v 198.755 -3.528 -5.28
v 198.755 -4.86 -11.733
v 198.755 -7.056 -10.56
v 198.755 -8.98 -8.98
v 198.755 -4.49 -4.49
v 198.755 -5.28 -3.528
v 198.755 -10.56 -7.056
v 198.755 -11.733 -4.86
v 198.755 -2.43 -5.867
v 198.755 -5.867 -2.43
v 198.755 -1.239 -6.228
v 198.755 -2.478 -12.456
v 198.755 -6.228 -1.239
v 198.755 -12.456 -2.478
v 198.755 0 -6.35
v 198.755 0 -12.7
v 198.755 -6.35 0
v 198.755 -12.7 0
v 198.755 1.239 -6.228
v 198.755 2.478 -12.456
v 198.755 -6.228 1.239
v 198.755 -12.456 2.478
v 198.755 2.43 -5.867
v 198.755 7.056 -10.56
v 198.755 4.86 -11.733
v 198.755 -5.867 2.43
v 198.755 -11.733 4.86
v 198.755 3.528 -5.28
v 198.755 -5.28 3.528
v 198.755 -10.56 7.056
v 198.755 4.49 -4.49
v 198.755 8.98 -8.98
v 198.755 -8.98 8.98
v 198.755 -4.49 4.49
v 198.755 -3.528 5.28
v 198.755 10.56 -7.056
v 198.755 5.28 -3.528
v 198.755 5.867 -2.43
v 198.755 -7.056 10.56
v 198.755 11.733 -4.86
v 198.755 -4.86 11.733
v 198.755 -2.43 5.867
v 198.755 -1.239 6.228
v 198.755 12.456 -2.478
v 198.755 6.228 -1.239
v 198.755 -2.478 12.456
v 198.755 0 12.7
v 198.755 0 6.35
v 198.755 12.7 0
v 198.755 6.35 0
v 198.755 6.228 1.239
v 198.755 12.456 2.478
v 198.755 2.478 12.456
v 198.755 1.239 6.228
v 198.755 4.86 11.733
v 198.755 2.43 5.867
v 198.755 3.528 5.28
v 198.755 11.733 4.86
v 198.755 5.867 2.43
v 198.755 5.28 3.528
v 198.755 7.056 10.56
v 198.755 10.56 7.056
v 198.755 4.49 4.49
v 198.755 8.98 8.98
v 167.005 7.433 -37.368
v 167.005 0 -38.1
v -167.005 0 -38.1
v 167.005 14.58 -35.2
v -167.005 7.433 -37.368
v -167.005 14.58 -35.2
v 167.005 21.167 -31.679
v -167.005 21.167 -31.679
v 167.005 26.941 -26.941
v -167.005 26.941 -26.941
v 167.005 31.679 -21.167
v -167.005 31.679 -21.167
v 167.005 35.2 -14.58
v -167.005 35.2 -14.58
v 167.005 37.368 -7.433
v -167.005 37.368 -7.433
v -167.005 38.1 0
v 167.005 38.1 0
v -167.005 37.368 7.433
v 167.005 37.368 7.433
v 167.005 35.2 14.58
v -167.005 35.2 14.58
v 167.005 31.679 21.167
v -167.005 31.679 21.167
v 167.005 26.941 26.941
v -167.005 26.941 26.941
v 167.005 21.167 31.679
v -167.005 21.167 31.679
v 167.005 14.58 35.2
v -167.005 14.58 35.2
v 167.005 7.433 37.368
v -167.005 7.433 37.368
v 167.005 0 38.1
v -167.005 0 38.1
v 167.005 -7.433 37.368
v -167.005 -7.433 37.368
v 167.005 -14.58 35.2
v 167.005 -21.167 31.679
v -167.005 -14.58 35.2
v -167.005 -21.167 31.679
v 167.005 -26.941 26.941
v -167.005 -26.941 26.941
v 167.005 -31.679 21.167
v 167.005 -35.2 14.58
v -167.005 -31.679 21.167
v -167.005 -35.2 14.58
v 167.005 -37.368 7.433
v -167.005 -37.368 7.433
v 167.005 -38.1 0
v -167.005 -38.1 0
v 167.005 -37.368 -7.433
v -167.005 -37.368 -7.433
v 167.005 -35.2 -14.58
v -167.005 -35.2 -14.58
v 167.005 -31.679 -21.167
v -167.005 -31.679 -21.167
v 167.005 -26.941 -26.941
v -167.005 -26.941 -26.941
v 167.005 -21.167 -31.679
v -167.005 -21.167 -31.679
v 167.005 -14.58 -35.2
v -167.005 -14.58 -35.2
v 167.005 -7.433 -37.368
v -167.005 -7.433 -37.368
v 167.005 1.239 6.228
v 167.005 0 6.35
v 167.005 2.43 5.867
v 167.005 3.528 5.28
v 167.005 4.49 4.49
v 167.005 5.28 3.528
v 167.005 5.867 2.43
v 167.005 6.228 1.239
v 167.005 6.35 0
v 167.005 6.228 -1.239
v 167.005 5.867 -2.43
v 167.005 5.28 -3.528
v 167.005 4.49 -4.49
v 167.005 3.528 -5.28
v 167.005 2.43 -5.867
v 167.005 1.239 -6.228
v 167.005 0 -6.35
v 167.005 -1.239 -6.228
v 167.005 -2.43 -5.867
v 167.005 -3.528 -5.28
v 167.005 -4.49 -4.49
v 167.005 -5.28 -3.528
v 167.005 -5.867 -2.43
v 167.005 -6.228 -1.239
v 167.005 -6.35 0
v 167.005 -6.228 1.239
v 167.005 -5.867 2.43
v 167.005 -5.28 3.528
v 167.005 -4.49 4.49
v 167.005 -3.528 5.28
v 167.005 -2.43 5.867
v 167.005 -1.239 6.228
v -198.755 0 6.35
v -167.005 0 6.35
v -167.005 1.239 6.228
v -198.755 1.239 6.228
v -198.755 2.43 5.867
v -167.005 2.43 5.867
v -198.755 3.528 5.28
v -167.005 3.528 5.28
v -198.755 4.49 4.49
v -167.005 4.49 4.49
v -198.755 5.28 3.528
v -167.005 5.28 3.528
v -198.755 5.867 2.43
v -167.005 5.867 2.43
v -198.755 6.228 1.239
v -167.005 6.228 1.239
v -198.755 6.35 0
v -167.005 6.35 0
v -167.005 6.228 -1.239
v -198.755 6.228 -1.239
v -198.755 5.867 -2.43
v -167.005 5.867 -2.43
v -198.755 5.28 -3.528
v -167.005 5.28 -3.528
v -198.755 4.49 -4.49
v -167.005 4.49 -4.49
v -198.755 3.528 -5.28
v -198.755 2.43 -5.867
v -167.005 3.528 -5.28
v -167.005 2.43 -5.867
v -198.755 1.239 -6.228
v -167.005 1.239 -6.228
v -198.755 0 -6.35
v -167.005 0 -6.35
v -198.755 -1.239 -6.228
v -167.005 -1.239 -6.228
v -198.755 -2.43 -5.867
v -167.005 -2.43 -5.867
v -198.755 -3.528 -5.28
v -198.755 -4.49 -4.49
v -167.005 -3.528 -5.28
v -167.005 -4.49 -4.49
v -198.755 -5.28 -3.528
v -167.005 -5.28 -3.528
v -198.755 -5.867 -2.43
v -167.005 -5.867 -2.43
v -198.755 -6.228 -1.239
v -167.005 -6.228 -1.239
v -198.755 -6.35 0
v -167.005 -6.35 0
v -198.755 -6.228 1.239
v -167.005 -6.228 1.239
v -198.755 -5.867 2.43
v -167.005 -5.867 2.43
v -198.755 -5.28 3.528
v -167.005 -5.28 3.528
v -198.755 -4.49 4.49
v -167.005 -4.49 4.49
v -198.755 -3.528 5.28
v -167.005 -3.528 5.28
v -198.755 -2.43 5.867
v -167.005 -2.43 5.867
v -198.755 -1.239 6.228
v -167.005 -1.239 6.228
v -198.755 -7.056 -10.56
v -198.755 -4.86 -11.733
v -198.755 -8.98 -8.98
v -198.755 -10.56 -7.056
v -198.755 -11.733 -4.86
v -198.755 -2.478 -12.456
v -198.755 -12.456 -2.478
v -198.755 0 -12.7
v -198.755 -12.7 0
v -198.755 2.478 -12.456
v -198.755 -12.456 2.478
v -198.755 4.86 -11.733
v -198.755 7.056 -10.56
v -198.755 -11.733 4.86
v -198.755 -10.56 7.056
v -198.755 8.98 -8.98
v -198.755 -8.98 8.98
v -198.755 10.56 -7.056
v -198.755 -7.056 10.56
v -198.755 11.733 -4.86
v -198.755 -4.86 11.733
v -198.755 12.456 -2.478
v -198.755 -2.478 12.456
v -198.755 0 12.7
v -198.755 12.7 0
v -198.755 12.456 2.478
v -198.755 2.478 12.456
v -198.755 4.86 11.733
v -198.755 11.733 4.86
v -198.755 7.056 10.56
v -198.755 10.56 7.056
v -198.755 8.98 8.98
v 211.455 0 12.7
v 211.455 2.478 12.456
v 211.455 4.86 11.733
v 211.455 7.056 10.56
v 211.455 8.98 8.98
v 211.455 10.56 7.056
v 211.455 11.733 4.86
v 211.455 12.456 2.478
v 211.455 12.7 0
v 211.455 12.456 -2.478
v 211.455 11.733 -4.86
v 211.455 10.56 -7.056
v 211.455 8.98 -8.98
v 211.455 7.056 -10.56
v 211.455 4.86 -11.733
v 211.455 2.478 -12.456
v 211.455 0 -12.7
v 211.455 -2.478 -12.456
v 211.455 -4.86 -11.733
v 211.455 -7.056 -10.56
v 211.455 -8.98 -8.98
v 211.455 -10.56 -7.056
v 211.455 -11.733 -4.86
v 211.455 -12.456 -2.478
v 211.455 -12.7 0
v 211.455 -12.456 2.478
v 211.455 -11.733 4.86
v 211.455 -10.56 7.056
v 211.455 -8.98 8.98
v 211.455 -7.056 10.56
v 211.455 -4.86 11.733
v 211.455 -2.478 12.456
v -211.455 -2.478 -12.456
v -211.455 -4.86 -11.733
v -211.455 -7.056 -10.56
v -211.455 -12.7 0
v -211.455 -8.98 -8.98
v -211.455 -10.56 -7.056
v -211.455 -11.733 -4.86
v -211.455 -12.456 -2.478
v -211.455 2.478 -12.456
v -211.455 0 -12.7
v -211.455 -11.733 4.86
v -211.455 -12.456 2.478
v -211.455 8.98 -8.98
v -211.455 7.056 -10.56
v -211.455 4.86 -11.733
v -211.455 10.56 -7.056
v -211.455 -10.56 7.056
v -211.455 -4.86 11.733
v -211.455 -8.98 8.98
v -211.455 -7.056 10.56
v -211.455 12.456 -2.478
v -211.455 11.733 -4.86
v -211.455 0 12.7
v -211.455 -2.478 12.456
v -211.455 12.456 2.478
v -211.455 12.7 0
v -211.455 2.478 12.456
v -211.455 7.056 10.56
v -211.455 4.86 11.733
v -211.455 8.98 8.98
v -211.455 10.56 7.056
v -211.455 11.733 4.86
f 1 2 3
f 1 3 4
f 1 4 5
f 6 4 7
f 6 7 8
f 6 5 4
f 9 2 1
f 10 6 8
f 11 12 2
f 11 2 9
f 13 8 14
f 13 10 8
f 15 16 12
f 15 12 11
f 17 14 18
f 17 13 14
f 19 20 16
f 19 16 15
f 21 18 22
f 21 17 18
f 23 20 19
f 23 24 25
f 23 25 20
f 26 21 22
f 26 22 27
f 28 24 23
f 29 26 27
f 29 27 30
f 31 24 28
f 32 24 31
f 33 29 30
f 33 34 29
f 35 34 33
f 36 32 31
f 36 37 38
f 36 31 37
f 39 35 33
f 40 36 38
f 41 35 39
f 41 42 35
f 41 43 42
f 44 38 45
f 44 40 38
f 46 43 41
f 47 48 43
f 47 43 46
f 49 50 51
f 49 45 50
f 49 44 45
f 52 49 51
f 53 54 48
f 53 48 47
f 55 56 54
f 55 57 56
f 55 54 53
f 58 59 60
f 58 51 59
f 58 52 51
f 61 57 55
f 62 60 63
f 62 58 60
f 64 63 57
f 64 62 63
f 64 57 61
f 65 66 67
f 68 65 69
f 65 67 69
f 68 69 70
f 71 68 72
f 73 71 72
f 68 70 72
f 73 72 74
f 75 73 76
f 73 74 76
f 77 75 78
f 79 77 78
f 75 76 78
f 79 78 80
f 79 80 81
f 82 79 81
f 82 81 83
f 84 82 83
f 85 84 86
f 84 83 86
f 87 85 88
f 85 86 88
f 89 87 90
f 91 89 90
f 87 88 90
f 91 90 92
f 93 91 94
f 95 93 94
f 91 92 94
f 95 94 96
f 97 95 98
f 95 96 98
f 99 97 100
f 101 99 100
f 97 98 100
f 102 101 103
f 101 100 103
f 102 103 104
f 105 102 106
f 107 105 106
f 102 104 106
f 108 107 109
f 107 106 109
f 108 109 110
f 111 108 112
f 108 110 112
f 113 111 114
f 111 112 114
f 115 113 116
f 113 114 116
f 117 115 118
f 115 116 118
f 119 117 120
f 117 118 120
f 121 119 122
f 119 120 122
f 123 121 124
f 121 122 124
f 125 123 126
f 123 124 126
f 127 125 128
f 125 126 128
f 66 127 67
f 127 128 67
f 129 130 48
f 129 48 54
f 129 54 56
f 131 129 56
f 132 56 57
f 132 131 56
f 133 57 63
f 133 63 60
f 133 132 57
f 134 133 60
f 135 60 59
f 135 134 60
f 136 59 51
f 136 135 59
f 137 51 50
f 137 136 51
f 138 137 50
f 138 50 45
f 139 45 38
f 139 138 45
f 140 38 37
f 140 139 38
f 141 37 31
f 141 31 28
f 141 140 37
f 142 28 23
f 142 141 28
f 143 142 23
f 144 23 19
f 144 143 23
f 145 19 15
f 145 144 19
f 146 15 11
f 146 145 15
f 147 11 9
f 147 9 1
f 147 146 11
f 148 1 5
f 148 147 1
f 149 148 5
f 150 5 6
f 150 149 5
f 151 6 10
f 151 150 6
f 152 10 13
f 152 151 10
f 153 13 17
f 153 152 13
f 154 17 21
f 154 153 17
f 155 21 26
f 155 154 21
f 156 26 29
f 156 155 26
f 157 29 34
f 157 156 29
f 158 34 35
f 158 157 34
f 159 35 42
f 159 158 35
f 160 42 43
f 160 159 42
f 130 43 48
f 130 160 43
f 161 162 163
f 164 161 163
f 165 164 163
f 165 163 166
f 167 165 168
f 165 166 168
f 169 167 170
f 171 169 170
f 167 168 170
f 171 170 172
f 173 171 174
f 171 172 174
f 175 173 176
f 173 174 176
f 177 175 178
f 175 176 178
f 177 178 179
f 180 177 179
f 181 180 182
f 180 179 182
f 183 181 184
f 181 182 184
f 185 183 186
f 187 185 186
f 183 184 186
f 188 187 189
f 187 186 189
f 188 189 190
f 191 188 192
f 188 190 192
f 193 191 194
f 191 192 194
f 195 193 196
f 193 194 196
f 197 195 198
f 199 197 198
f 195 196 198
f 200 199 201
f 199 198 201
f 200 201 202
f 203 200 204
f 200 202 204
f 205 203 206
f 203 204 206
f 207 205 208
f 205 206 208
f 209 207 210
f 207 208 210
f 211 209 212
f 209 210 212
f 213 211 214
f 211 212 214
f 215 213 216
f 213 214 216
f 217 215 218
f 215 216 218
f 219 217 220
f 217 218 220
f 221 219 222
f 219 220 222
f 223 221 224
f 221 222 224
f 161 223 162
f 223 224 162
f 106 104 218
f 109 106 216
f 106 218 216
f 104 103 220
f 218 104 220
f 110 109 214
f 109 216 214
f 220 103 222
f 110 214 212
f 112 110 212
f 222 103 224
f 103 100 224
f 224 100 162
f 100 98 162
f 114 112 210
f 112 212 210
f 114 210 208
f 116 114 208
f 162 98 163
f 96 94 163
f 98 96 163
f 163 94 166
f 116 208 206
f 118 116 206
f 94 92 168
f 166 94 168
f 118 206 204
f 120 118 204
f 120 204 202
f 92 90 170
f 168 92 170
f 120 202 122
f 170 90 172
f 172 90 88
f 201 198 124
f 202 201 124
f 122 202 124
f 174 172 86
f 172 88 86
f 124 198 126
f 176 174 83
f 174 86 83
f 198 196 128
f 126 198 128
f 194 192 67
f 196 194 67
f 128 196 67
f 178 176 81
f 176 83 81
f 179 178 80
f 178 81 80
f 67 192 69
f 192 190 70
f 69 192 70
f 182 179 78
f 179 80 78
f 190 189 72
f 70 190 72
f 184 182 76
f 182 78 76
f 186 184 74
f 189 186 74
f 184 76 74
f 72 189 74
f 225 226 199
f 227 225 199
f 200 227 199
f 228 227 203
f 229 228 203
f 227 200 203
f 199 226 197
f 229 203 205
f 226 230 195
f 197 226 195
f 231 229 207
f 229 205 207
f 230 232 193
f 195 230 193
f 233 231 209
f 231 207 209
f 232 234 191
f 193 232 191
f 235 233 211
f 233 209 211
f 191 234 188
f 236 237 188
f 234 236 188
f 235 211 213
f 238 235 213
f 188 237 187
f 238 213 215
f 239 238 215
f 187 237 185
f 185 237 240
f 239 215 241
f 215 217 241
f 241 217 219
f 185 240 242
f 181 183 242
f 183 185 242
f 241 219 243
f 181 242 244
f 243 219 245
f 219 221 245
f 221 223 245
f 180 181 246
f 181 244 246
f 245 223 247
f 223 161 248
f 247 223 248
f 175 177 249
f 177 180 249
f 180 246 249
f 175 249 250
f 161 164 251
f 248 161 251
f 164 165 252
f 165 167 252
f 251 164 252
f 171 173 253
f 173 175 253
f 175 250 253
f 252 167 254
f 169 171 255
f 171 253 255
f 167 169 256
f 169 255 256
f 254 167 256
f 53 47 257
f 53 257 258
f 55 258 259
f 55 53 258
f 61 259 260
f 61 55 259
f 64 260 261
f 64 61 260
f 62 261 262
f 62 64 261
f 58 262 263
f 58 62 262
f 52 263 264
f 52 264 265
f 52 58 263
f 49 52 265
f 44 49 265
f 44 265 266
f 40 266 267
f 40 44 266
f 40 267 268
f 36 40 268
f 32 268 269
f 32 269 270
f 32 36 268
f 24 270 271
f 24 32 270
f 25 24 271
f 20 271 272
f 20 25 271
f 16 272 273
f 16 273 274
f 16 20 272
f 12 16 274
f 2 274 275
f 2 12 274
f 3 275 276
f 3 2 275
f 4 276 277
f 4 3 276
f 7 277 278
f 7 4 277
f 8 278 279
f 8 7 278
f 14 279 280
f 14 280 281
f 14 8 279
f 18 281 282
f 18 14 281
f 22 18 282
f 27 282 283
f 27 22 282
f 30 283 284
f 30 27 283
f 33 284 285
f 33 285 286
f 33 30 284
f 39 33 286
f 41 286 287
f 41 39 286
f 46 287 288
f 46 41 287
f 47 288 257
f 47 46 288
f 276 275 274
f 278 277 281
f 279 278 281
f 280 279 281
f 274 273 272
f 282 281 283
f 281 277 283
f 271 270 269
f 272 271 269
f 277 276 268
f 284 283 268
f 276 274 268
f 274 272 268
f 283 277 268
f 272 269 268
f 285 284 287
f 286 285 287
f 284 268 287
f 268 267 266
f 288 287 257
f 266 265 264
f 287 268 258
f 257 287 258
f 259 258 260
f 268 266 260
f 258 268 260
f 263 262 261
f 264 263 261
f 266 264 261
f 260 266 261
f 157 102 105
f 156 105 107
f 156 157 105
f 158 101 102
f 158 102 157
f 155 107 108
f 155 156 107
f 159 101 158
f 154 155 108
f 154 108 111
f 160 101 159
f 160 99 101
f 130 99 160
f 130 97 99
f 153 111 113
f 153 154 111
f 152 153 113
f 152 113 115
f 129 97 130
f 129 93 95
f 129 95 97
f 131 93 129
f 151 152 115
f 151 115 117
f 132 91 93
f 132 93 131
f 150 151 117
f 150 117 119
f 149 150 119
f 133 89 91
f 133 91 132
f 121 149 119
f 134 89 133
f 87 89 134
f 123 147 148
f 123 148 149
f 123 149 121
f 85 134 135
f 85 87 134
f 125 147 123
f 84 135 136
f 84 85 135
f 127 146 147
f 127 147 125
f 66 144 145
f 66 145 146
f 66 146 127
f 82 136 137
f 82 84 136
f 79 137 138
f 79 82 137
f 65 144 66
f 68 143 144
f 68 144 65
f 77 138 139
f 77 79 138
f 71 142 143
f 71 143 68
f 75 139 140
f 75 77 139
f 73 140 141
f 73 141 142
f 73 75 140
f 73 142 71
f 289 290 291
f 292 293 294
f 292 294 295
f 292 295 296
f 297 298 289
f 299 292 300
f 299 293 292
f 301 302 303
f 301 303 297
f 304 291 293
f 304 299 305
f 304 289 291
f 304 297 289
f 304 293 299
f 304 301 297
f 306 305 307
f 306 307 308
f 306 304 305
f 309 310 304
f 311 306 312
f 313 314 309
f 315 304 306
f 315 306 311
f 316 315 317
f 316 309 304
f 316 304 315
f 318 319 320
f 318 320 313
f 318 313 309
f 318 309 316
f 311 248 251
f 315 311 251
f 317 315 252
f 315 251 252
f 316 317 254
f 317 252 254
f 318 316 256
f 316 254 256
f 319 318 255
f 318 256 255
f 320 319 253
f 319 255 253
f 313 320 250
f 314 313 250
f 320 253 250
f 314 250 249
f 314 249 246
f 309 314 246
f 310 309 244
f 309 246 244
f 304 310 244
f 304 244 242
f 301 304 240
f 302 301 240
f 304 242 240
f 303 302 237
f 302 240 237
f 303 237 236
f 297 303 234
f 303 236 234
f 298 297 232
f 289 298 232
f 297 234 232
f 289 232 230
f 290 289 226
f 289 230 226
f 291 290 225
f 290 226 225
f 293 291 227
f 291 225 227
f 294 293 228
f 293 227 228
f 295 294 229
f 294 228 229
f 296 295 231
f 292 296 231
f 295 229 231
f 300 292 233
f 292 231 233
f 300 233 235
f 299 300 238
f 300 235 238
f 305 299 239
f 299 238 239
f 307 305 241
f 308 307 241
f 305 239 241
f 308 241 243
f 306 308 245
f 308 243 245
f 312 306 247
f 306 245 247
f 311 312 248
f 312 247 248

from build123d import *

# Parameters (mm, degrees)
BOSS_EXTRUDE1_DEPTH      = 167.005
BOSS_EXTRUDE1_DEPTH_BACK = 167.005
SKETCH1_R                = 38.1
SKETCH2_R                = 6.35
BOSS_EXTRUDE2_DEPTH      = 31.75
SKETCH3_R                = 12.7
BOSS_EXTRUDE3_DEPTH      = 12.7


with BuildPart() as part:
    # Sketch1 → Boss-Extrude1 (new, two sides: drawn at the far end of the back side and taken through both)
    with BuildSketch(Plane(origin=(0, 0, 0), x_dir=(0, 0, -1), z_dir=(1, 0, 0)).offset(-BOSS_EXTRUDE1_DEPTH_BACK)):
        Circle(SKETCH1_R)
    extrude(amount=BOSS_EXTRUDE1_DEPTH + BOSS_EXTRUDE1_DEPTH_BACK)

    # Sketch2 → Boss-Extrude2 (add)
    with BuildSketch(Plane.ZY.offset(167.005)):
        Circle(SKETCH2_R)
    boss_extrude2 = extrude(amount=BOSS_EXTRUDE2_DEPTH)

    # Sketch3 → Boss-Extrude3 (add)
    with BuildSketch(Plane.ZY.offset(198.755)):
        Circle(SKETCH3_R)
    boss_extrude3 = extrude(amount=BOSS_EXTRUDE3_DEPTH)

    # Mirror1: Boss-Extrude2, Boss-Extrude3 across plane
    add(boss_extrude2.mirror(Plane(origin=(0, 0, 0), x_dir=(0, 0, 1), z_dir=(1, 0, 0))))
    add(boss_extrude3.mirror(Plane(origin=(0, 0, 0), x_dir=(0, 0, 1), z_dir=(1, 0, 0))))


solid = part.part
